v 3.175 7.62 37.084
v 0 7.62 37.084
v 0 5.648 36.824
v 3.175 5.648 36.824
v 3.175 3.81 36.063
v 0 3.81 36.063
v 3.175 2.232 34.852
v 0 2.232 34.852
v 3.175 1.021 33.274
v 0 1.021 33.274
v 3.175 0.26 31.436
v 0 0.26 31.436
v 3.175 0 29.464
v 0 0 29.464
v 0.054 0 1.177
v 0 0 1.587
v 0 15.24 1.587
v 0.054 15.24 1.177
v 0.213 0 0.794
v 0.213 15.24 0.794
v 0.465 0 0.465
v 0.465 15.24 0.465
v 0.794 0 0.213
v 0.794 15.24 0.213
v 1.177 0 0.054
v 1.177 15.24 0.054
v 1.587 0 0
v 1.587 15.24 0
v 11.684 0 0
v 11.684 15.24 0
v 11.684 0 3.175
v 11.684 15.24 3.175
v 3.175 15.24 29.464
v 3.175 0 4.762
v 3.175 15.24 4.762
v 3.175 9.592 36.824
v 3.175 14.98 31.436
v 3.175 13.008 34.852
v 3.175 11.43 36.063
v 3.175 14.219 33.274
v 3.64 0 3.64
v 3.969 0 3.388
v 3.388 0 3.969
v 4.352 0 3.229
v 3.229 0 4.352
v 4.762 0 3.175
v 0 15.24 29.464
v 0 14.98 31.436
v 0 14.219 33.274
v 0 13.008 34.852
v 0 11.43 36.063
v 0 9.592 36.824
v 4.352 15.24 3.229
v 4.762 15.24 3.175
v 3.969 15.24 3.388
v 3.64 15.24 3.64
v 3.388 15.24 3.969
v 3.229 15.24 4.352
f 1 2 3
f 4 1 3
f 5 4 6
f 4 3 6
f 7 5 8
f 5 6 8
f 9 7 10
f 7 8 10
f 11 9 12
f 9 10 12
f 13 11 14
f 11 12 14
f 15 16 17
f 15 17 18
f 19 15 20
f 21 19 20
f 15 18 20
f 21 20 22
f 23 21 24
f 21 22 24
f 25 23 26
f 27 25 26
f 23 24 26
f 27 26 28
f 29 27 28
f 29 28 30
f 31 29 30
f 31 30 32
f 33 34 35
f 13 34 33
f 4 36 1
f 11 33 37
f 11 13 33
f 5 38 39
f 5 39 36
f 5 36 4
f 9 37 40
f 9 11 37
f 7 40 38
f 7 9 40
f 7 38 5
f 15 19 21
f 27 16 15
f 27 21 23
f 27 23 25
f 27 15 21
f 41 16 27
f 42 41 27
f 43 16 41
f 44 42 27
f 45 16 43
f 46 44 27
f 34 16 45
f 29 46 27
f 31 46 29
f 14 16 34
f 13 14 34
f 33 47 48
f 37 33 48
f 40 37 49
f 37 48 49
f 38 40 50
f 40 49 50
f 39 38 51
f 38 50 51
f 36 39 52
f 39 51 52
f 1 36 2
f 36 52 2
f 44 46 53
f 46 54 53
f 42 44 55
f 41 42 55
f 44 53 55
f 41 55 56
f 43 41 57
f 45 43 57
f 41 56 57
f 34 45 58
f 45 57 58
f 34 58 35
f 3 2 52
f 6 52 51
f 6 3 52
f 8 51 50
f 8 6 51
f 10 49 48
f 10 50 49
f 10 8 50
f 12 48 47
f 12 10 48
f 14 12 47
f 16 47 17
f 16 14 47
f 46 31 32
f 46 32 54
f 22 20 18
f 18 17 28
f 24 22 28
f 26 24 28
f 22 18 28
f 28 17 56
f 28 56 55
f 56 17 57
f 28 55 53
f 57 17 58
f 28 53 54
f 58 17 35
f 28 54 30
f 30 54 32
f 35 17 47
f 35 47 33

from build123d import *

# Parameters (mm, degrees)
F1_DEPTH = 15.24
F2_R     = 1.5875
F4_DEPTH = 3.175


with BuildPart() as f1:
    # F0 (on Front) → F1 (new body)
    with BuildSketch(Plane.XZ):
        Polygon((3.175, 37.084), (0, 37.084), (0, 0), (11.684, 0), (11.684, 3.175), (3.175, 3.175), align=None)
    extrude(amount=-F1_DEPTH)

    # F2
    f2_edges = [f1.edges().sort_by_distance(p)[0] for p in [
        (3.175, 7.62, 3.175),
        (0, 7.62, 0),
    ]]
    fillet(f2_edges, radius=F2_R)

    # F3 (on face) → F4 (cut, through all)
    with BuildSketch(Plane(origin=(0, 0, 0), x_dir=(0, -1, 0), z_dir=(-1, 0, 0))):
        with BuildLine():
            ThreePointArc((-15.24, 29.464), (-13.0081536726, 34.8521536726), (-7.62, 37.084))
            Line((-7.62, 37.084), (-15.24, 37.084))
            Line((-15.24, 37.084), (-15.24, 29.464))
        make_face()
        with BuildLine():
            ThreePointArc((-7.62, 37.084), (-2.2318463274, 34.8521536726), (0, 29.464))
            Line((0, 29.464), (0, 37.084))
            Line((0, 37.084), (-7.62, 37.084))
        make_face()
    extrude(amount=-F4_DEPTH, mode=Mode.SUBTRACT)


solid = f1.part
